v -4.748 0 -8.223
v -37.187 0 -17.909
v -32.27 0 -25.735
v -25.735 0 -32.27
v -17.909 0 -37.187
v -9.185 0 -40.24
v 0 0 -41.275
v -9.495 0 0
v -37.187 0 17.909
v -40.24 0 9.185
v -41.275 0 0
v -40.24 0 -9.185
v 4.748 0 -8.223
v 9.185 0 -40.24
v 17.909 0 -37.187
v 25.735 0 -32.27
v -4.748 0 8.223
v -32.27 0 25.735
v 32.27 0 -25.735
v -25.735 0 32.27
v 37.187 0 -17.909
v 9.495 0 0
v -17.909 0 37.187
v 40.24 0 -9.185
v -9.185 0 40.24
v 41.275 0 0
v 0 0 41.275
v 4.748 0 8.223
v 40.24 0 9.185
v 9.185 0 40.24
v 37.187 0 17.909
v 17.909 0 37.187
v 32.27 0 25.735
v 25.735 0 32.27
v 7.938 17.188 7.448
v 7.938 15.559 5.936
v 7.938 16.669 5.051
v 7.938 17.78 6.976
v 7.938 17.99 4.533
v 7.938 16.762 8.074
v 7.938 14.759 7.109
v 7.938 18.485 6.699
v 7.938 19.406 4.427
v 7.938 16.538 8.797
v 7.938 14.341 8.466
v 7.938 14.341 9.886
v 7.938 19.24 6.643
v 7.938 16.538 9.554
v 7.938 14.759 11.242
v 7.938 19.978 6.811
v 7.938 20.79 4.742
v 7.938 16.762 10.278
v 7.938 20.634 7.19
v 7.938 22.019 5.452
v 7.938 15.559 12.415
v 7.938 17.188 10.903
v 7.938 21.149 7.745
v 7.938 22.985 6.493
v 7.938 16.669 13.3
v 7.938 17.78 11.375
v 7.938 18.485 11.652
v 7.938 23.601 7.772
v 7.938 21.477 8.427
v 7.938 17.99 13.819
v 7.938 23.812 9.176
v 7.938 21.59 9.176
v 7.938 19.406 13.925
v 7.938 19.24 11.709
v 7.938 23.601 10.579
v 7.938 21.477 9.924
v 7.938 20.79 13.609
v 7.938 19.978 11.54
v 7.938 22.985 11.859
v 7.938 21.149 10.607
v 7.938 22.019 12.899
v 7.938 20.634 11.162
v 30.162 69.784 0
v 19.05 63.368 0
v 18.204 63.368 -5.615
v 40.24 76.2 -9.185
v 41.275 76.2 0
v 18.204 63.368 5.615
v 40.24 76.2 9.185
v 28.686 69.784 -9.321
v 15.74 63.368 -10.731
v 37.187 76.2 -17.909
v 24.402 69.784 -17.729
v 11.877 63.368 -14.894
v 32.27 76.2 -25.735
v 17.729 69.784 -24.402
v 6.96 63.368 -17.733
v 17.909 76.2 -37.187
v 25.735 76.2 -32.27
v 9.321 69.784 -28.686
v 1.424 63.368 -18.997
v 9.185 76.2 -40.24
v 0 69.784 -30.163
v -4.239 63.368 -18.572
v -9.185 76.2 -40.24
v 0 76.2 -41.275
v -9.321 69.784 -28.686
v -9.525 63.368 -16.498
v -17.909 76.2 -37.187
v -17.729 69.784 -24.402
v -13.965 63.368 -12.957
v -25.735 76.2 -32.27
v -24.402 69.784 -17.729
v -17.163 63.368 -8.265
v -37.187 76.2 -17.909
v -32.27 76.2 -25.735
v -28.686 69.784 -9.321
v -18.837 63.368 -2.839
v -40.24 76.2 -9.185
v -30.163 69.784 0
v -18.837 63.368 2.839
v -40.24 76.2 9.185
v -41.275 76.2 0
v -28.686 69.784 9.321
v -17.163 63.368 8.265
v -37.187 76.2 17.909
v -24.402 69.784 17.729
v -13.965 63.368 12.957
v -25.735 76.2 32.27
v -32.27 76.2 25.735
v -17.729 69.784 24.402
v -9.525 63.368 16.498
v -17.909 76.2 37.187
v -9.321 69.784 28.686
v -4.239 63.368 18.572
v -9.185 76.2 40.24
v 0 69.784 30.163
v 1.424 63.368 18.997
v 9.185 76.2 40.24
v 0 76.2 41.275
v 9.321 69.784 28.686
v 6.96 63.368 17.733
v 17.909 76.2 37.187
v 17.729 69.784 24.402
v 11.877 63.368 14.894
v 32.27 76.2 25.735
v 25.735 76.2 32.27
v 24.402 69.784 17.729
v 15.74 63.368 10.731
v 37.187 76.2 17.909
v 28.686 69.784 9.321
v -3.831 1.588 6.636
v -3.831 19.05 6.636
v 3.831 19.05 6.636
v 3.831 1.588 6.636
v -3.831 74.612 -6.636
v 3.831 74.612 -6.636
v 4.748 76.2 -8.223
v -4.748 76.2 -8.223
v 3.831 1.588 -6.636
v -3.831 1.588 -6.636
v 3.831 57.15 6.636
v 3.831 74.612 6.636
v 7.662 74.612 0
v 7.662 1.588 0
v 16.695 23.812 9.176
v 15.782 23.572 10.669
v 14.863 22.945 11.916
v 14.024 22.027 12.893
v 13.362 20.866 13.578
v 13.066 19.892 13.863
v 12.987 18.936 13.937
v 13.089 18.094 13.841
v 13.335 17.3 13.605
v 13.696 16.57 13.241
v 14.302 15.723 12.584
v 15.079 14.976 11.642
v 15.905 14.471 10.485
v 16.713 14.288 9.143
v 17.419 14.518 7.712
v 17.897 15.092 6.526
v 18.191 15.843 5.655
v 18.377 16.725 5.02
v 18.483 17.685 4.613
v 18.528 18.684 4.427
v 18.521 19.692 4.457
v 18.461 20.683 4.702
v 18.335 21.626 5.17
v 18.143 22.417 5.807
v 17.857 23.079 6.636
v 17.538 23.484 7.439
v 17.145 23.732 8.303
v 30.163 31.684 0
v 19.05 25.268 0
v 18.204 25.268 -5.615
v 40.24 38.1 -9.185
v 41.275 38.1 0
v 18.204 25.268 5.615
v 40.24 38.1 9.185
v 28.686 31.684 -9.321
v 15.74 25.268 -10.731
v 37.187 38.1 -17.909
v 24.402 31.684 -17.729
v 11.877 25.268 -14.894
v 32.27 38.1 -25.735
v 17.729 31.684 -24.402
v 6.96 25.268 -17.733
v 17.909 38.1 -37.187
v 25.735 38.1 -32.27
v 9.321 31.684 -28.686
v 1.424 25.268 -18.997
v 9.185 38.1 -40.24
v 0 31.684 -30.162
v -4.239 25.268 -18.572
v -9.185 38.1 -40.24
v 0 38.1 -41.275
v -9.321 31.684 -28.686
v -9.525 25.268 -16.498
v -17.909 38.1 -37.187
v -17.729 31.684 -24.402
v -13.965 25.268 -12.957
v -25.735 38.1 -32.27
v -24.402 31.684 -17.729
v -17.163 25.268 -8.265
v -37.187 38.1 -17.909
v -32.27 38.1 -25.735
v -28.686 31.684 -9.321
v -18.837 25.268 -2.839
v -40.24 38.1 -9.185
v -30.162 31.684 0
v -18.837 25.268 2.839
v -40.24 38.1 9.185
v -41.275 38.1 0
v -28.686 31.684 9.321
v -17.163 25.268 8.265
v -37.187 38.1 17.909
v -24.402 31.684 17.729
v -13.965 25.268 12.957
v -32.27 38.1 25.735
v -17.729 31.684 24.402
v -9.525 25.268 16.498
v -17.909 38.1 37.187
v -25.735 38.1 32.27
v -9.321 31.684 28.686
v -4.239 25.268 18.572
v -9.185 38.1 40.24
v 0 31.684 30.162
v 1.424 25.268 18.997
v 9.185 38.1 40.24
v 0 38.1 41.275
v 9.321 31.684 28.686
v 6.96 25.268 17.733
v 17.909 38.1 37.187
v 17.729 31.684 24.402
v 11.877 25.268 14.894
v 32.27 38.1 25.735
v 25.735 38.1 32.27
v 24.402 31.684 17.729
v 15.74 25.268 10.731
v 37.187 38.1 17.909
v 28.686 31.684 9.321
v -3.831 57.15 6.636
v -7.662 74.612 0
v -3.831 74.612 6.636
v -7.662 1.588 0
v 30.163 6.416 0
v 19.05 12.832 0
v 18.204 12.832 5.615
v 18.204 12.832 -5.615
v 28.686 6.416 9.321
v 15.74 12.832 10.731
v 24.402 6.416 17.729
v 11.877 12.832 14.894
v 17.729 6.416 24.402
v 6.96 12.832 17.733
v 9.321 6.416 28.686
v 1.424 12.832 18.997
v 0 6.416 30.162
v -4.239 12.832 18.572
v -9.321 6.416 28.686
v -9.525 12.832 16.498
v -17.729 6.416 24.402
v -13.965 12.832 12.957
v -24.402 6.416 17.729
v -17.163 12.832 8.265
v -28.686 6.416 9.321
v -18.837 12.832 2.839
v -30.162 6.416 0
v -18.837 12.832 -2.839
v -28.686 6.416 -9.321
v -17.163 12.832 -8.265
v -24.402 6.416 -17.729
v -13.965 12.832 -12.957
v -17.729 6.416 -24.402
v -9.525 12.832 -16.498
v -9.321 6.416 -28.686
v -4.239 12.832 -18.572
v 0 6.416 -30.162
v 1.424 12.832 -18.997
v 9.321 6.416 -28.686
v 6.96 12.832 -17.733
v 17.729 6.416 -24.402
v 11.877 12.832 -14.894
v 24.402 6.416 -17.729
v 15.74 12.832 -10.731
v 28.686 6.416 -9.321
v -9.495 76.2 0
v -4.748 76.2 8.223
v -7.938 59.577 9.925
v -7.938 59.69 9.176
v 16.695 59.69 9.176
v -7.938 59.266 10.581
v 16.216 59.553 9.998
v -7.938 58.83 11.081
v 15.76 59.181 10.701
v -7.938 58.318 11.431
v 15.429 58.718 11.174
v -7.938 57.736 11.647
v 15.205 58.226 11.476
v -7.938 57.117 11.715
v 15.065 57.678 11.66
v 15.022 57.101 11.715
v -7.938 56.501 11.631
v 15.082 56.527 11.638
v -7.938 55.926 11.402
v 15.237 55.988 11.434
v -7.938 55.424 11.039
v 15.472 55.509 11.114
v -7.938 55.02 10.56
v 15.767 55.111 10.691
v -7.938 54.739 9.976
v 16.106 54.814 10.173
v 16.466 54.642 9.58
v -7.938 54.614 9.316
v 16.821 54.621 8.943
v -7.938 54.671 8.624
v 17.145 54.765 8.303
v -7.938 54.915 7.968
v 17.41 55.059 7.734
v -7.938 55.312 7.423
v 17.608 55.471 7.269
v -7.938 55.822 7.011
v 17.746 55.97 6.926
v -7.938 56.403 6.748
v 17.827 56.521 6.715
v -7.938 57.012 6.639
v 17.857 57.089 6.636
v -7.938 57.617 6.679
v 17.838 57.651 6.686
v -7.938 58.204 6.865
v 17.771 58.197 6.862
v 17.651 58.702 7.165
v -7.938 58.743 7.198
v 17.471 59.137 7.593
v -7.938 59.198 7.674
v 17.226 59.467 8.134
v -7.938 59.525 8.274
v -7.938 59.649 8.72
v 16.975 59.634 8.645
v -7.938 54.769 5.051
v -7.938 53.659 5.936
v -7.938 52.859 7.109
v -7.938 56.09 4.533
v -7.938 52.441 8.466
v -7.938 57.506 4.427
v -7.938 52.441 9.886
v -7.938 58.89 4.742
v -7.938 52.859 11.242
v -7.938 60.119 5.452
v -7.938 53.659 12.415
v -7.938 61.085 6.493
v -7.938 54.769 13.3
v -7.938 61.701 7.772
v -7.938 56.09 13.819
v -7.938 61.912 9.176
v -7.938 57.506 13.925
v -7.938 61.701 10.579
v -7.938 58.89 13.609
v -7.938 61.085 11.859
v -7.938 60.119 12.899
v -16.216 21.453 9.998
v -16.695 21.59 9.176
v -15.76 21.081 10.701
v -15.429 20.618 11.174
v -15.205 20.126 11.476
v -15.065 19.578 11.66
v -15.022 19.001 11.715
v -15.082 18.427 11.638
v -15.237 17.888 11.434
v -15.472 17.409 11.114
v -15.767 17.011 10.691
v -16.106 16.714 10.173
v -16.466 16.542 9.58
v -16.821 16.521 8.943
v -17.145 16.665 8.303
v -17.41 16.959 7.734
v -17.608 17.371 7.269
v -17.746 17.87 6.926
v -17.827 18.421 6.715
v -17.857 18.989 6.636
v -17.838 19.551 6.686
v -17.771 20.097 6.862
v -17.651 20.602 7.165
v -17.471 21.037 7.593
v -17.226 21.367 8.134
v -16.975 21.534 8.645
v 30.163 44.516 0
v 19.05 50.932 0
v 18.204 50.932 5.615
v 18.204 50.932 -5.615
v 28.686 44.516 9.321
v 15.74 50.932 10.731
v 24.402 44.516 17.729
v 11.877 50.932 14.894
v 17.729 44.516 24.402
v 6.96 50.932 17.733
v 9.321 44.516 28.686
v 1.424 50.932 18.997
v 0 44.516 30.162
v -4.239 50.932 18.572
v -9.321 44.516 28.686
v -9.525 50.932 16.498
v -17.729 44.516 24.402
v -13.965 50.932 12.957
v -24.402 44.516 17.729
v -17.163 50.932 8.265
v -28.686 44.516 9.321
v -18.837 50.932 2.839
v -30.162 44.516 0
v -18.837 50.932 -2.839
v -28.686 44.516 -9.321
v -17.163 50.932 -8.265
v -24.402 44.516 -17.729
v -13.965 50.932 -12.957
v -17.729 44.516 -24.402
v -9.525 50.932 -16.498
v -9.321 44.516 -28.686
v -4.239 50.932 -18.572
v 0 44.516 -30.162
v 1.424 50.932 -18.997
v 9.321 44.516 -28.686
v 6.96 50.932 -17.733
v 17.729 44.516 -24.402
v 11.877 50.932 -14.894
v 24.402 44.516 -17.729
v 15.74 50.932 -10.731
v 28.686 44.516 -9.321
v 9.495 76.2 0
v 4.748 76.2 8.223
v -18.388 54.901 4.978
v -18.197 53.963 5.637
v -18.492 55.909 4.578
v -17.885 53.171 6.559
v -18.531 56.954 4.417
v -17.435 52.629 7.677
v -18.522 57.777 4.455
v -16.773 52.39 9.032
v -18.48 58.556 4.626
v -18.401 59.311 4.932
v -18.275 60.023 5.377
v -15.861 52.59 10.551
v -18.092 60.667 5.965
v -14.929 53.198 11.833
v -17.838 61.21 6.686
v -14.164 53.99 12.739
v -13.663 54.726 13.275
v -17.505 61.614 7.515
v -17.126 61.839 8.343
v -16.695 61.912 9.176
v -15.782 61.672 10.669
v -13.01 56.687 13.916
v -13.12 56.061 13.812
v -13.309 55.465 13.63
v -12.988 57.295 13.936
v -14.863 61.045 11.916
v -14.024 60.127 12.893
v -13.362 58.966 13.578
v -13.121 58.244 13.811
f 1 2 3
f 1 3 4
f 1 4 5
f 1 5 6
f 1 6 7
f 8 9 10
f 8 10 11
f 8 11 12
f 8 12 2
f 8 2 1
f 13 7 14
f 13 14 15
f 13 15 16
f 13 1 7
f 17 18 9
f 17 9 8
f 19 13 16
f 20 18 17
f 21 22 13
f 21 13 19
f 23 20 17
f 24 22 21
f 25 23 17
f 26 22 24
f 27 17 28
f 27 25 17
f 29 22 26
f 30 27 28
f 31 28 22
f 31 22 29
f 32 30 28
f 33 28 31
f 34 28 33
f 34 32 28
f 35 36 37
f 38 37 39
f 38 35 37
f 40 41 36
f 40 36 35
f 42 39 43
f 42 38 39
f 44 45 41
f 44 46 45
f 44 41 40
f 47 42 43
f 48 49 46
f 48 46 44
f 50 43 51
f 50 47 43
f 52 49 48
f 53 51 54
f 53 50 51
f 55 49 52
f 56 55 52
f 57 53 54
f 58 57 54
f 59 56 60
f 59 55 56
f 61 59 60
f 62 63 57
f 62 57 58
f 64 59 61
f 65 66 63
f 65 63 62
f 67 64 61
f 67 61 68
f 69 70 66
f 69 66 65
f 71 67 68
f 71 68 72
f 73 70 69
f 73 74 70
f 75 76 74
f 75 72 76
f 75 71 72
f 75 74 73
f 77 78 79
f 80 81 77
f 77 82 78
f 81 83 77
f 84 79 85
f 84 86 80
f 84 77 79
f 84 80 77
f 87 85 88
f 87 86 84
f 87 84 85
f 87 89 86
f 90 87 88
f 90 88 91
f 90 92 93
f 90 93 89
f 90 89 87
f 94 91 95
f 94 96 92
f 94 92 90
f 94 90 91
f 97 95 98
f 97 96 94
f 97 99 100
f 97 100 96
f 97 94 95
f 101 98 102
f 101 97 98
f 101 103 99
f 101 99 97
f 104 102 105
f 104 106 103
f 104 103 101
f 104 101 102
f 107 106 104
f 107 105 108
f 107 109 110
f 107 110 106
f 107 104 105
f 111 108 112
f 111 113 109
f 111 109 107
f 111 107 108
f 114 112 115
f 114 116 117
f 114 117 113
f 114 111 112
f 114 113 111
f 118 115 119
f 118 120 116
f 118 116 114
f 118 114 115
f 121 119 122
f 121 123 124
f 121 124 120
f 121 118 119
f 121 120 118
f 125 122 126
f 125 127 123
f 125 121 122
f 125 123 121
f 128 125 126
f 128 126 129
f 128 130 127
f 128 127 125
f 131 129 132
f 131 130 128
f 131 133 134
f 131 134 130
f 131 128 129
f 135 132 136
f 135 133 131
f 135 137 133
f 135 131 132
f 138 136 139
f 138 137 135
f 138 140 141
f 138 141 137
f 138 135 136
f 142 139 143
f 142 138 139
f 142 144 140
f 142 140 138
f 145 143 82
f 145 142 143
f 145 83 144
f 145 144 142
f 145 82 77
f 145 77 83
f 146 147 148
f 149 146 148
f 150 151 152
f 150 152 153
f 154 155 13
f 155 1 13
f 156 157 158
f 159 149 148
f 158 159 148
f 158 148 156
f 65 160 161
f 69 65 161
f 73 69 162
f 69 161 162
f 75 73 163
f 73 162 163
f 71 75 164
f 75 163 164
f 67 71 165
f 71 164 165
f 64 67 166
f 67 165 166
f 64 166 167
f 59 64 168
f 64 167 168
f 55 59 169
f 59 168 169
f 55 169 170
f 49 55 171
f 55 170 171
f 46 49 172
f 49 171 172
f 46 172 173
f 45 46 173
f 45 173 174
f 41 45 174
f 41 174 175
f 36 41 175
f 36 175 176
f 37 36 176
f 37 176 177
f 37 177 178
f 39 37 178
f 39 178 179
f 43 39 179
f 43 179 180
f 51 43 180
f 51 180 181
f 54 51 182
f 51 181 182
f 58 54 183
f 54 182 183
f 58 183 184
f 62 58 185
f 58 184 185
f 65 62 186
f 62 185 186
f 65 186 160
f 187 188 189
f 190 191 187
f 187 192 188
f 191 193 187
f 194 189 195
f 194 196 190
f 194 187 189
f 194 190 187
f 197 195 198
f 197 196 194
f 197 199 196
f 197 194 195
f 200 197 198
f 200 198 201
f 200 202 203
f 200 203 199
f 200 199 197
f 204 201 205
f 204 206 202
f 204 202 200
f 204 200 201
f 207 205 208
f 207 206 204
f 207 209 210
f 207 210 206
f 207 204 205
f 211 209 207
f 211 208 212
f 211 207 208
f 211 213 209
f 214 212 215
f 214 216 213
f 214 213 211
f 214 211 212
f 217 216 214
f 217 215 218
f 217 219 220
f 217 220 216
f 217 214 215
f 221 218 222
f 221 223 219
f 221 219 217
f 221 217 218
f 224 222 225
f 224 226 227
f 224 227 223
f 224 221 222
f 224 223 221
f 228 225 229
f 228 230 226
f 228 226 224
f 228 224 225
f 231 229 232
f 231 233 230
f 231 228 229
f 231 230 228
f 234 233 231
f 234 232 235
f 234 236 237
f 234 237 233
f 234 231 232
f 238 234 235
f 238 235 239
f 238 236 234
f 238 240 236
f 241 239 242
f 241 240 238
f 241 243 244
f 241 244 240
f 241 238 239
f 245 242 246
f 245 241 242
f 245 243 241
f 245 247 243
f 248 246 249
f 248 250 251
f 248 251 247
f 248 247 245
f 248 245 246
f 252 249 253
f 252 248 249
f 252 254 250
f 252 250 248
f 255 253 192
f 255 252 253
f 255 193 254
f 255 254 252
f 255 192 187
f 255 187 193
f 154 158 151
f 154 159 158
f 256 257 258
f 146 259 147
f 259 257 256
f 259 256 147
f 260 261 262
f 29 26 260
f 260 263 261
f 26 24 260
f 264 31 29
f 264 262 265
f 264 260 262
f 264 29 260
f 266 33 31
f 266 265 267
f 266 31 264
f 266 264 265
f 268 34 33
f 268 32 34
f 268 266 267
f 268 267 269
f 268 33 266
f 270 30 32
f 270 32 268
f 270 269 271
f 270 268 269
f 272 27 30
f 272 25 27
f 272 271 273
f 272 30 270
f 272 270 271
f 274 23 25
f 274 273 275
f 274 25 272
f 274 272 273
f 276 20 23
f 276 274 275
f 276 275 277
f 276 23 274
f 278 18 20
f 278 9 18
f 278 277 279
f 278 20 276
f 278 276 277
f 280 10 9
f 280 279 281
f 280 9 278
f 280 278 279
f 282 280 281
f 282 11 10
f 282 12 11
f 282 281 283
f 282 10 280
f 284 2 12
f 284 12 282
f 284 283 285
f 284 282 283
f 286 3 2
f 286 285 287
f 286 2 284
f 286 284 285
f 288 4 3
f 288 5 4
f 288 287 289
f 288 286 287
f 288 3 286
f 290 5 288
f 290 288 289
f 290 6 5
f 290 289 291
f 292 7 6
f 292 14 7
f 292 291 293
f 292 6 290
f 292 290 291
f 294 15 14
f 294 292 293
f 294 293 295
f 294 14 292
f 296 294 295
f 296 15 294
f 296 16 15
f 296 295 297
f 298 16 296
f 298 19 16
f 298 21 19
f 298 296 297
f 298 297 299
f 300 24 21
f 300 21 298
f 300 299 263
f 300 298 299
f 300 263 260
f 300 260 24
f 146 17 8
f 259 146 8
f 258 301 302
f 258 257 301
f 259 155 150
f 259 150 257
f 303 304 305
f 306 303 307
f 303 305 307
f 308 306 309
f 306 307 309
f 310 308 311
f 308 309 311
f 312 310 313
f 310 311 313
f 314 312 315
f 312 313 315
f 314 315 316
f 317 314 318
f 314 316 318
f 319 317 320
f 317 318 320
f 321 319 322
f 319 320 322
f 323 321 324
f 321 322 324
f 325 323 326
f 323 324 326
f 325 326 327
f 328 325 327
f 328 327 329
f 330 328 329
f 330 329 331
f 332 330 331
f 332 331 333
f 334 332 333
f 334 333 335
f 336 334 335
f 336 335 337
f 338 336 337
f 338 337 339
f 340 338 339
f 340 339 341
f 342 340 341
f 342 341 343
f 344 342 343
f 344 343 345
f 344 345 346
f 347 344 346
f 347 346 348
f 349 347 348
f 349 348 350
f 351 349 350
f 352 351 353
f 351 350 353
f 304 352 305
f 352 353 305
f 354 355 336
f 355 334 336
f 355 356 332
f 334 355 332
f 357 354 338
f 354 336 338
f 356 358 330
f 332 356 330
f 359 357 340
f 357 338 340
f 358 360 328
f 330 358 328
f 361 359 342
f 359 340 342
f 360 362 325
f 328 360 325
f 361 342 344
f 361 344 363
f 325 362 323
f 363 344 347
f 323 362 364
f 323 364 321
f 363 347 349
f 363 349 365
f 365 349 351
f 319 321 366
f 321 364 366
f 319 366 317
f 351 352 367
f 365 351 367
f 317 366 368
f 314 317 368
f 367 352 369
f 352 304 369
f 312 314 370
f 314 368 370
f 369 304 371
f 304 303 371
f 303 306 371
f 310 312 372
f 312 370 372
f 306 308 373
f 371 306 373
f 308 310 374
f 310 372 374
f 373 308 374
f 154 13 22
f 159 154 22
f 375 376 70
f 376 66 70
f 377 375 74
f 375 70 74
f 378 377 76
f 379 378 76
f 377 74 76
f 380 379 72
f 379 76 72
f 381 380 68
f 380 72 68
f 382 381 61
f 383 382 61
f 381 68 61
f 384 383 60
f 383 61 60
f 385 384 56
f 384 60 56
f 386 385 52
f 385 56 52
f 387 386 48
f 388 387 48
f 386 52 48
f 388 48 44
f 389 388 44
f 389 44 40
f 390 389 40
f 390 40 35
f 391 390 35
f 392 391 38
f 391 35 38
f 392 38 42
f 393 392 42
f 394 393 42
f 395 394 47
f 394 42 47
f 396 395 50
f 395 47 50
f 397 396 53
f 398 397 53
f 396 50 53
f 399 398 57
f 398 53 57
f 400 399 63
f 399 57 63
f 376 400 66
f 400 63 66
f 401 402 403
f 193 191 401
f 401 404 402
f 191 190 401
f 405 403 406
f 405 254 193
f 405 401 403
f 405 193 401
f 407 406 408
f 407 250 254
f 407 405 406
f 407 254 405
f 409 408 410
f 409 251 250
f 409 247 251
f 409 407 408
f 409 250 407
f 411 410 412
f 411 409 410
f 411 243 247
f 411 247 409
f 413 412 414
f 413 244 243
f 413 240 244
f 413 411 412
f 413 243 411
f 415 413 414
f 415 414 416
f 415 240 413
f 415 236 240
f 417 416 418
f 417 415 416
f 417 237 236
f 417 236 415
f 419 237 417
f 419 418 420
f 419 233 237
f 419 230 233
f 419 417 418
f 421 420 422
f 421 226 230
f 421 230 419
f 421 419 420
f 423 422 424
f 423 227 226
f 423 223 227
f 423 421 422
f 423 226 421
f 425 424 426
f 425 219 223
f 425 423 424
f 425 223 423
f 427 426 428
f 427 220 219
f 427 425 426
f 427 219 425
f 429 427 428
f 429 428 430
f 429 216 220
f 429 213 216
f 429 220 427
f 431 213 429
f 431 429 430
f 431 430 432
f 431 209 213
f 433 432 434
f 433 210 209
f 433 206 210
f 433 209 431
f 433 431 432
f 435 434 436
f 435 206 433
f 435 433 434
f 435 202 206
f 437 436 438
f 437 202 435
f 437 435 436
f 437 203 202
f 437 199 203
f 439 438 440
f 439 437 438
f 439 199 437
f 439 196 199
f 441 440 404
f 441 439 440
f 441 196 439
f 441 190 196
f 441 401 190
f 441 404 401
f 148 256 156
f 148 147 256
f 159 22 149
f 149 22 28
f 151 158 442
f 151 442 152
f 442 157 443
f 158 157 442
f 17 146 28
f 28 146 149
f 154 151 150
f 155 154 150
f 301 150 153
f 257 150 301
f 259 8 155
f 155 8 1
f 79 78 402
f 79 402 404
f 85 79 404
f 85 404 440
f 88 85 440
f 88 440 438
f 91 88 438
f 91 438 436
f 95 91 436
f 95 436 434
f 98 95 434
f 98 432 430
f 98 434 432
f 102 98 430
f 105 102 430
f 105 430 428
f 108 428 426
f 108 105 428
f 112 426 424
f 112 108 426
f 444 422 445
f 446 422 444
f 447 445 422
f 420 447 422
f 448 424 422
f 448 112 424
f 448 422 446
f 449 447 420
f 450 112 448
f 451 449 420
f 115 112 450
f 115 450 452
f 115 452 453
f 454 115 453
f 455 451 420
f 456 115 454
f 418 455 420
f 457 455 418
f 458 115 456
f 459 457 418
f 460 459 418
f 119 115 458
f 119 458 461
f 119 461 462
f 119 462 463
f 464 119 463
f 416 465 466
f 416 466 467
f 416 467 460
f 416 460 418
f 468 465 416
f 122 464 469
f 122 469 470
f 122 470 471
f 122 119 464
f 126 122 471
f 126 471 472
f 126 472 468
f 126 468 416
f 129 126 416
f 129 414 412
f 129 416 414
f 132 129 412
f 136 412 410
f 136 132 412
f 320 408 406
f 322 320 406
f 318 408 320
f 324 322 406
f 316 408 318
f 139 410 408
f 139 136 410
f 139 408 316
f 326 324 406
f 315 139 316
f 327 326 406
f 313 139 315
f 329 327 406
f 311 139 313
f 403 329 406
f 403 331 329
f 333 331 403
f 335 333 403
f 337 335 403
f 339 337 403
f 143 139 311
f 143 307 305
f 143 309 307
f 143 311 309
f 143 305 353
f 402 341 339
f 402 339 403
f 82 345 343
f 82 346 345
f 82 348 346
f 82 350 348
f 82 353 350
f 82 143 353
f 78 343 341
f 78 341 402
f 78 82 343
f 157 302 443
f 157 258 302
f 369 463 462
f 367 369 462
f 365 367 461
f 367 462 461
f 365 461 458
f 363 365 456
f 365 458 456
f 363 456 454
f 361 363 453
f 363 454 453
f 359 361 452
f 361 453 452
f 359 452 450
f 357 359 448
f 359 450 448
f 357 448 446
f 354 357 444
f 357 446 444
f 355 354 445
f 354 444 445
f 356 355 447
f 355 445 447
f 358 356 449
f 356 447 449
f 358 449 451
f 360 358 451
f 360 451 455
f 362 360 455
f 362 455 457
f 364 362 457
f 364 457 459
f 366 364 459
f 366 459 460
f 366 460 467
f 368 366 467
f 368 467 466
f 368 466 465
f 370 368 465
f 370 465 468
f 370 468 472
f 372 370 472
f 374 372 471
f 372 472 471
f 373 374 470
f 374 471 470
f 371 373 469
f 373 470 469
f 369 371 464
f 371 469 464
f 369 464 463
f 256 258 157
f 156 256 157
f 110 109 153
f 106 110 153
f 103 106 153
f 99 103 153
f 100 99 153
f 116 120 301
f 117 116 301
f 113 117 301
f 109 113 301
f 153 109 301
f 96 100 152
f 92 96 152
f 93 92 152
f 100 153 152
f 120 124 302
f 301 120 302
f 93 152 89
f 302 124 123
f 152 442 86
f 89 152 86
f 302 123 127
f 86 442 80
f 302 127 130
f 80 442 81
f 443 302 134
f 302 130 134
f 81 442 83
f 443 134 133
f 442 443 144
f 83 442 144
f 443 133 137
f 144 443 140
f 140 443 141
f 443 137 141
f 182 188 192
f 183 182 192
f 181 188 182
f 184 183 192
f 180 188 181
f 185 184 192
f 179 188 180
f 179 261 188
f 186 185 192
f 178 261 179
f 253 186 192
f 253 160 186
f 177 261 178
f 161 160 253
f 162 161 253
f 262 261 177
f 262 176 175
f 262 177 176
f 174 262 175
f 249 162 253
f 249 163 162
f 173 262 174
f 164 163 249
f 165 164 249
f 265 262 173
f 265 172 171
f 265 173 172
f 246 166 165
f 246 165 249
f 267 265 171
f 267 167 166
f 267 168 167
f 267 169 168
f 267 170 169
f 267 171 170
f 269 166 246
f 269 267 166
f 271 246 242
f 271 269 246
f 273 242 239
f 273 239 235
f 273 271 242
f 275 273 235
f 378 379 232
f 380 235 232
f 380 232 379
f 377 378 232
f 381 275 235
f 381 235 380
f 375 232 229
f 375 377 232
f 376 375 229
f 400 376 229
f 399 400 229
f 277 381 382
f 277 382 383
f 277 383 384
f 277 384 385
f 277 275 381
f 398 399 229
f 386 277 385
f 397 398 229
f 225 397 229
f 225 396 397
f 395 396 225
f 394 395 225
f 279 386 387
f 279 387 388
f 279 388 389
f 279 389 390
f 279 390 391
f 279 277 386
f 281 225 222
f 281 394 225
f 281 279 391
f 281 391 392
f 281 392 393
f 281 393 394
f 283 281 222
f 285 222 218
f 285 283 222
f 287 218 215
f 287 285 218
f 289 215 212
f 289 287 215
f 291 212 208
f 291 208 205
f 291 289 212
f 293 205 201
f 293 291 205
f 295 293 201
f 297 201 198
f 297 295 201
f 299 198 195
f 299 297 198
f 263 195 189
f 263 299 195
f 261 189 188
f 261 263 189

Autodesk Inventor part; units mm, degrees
ref_plane "XZ Plane" through (0, 0, 0) normal (0, 1, 0) x (-1, 0, 0)
sketch "Sketch15" plane through (0, 0, 0) normal (0, 0, 1) x (1, 0, 0)
  line L0 (41.275, 0) -> (41.275, 76.2) construction
  line L1 (0, 0) -> (41.275, 0)
  line L2 (0, 76.2) -> (41.275, 76.2)
  line L3 (19.05, 0) -> (19.05, 76.2) construction
  line L4 (0, 76.2) -> (0, 0)
  line L5 (19.05, 19.05) -> (41.275, 19.05) construction
  line L6 (41.275, 0) -> (19.05, 12.8316)
  line L7 (41.275, 38.1) -> (19.05, 25.2684)
  line L8 (19.05, 25.2684) -> (41.275, 25.2684) construction
  line L9 (19.05, 25.2684) -> (19.05, 12.8316)
  line L10 (41.275, 38.1) -> (19.05, 50.9316)
  line L11 (19.05, 50.9316) -> (19.05, 63.3684)
  line L12 (19.05, 63.3684) -> (41.275, 76.2)
  line L13 (41.275, 38.1) -> (19.05, 38.1) construction
  line L14 (19.05, 63.3684) -> (41.275, 63.3684) construction
  dimension "d85" = 41.275
  dimension "d86" = 76.2
  dimension "d87" = 19.05
  dimension "d88" = 41.275
  dimension "d89" = 38.1
  dimension "centerLineForSpool" = 19.05
  dimension "d93" = 30
  dimension "d94" = 30
  dimension "d95" = 30
  dimension "d96" = 30
revolve "Revolution2" add sketch "Sketch15" angle 360 about axis through (0, 76.2, 0) along (0, -1, 0)
sketch "Sketch16" plane through (0, 0, 0) normal (0, -1, 0) x (1, 0, 0)
  line L0 (-7.6623, 0) -> (-3.8312, 6.6357)
  line L1 (-3.8312, 6.6357) -> (3.8312, 6.6357)
  line L2 (3.8312, 6.6357) -> (7.6623, 0)
  line L3 (7.6623, 0) -> (3.8312, -6.6358)
  line L4 (3.8312, -6.6358) -> (-3.8312, -6.6358)
  line L5 (-3.8312, -6.6358) -> (-7.6623, 0)
  point P0 (0, 0)
  point P1 (0, 0)
  dimension "d103" = 13.2715
extrude "Extrusion11" cut sketch "Sketch16" against normal through all
sketch "Sketch17" plane through (0, 0, 0) normal (1, 0, 0) x (0, 1, 0)
  circle A0 centre (57.15, 9.1757) radius 2.54
  circle A1 centre (19.05, 9.1757) radius 2.54
  line L0 (0, 41.275) -> (0, -41.275) projected
  line L1 (76.2, 41.275) -> (76.2, -41.275) projected
  line L2 (0, 6.6357) -> (76.2, 6.6357) projected
  point P0 (0, 0)
  dimension "d110" = 19.05
  dimension "d111" = 19.05
  dimension "d112" = 5.08
extrude "Extrusion13" cut sketch "Sketch17" along normal through all both and the other way through all
ref_plane "Work Plane4" through (-19.05, 0, 0) normal (1, 0, 0) x (0, 1, 0)
sketch "Sketch22" plane through (-19.05, 0, 0) normal (1, 0, 0) x (0, 1, 0)
  spline S0 degree 8 poles (59.69, 9.1757) (59.69, 9.4517) (59.6557, 9.7212) (59.59, 9.9804) (59.4956, 10.2261) (59.3755, 10.4557) (59.2323, 10.6669) (59.0691, 10.858) (58.7144, 11.191) (58.5225, 11.336) (58.3154, 11.4599) (58.0958, 11.5609) (57.8667, 11.6378) (57.6308, 11.6896) (57.3909, 11.7157) (56.8686, 11.7157) (56.5893, 11.6801) (56.3163, 11.6098) (56.0539, 11.5059) (55.8062, 11.37) (55.5775, 11.2041) (55.3719, 11.0111) (55.0147, 10.5794) (54.8595, 10.3366) (54.7333, 10.0693) (54.6415, 9.7817) (54.5882, 9.479) (54.5771, 9.1672) (54.6105, 8.8531) (54.8032, 8.1024) (55.0034, 7.6991) (55.2751, 7.3483) (55.6037, 7.0608) (55.9729, 6.8444) (56.3656, 6.703) (56.7635, 6.6357) (57.4276, 6.6357) (57.7065, 6.6704) (57.9827, 6.7403) (58.2517, 6.8459) (58.509, 6.9871) (58.7494, 7.1637) (58.9676, 7.3748) (59.2832, 7.7816) (59.3962, 7.9584) (59.4932, 8.1474) (59.5721, 8.3459) (59.6315, 8.5511) (59.6708, 8.76) (59.69, 8.9692) (59.69, 9.1757) knots 0 0 0 0 0 0 0 0 0 0.129052 0.129052 0.129052 0.129052 0.129052 0.129052 0.129052 0.253777 0.253777 0.253777 0.253777 0.253777 0.253777 0.253777 0.399469 0.399469 0.399469 0.399469 0.399469 0.399469 0.399469 0.544533 0.544533 0.544533 0.544533 0.544533 0.544533 0.544533 0.751894 0.751894 0.751894 0.751894 0.751894 0.751894 0.751894 0.900801 0.900801 0.900801 0.900801 0.900801 0.900801 0.900801 1 1 1 1 1 1 1 1 1 projected
  circle A0 centre (57.15, 9.1757) radius 4.7625
  circle A1 centre (57.15, 9.1757) radius 2.54 construction
  line L0 (57.15, 6.6357) -> (76.2, 6.6357) construction
  line L1 (76.2, 41.275) -> (76.2, -41.275) construction
  point P0 (0, 0)
  dimension "d121" = 19.05
  dimension "d122" = 5.08
  dimension "d125" = 9.525
extrude "Extrusion16" cut sketch "Sketch22" along normal blind 11.1125
ref_plane "Work Plane5" through (19.05, 0, 0) normal (1, 0, 0) x (0, 1, 0)
sketch "Sketch23" plane through (19.05, 0, 0) normal (1, 0, 0) x (0, 1, 0)
  line L0 (19.05, 6.6357) -> (57.15, 6.6357) projected
  circle A0 centre (19.05, 9.1757) radius 2.54 construction
  line L1 (0, 41.275) -> (0, -41.275) projected
  circle A1 centre (19.05, 9.1757) radius 4.7625
  point P0 (0, 0)
  dimension "d127" = 5.08
  dimension "d128" = 19.05
  dimension "d129" = 9.525
extrude "Extrusion17" cut sketch "Sketch23" against normal blind 11.1125
chamfer "Chamfer10" distance 1.5875 angle 45 12 edges at (0, 76.2, -6.6358) (5.7467, 76.2, -3.3179) (5.7467, 76.2, 3.3179) (0, 76.2, 6.6357) (-5.7467, 76.2, 3.3179) (-5.7467, 76.2, -3.3179) (-5.7467, 0, -3.3179) (-5.7467, 0, 3.3179) (0, 0, 6.6357) (5.7467, 0, 3.3179) (5.7467, 0, -3.3179) (0, 0, -6.6358)
equation "\"d85\" = spoolExteriorRadius"
equation "\"d86\" = spoolOverallHeight"
equation "\"d88\" = d85"
equation "\"d89\" = 0.5 * spoolOverallHeight"
equation "\"centerLineForSpool\" = 0.25 * spoolOverallHeight"
equation "\"d103\" = hexDiameter"
equation "\"d110\" = centerLineForSpool"
equation "\"d111\" = centerLineForSpool"
equation "\"d112\" = holeForString"
equation "\"d121\" = centerLineForSpool"
equation "\"d122\" = holeForString"
equation "\"d125\" = knotHoleDiameter"
equation "\"d127\" = holeForString"
equation "\"d128\" = centerLineForSpool"
equation "\"d129\" = knotHoleDiameter"
equation "\"d130\" = knotHoleDepth"
equation "\"d132\" = hexHoleChamfer"
equation "\"holeForString\" = stringDiameter + clearanceForString"
equation "\"stringDiameter\" = 3.048"
equation "\"clearanceForString\" = 2.032"
equation "\"spoolHeightWithoutSpacer\" = 69.85"
equation "\"hexShaftDiameter\" = 12.7"
equation "\"clearanceForHexShaft\" = 0.5715"
equation "\"hexDiameter\" = hexShaftDiameter + clearanceForHexShaft"
equation "\"supportChannels\" = 3.81"
equation "\"spoolInteriorDiameter\" = 38.1"
equation "\"spoolInteriroRadius\" = 0.5 * spoolInteriorDiameter"
equation "\"spoolExteriorDiameter\" = 82.55"
equation "\"spoolExteriorRadius\" = 0.5 * spoolExteriorDiameter"
equation "\"spoolFiletRadius\" = 0.5 * supportChannels"
equation "\"holeCenter\" = 0.25 * spoolHeightWithoutSpacer - 0.75 * supportChannels"
equation "\"hexHoleChamfer\" = 1.5875"
equation "\"stringHoleCenterFromHexShaft\" = 0.5 * hexDiameter + 0.5 * holeForString"
equation "\"textCircleDiameter\" = 0.75 * spoolExteriorDiameter"
equation "\"textHeight\" = 6.096"
equation "\"textDepth\" = 1.27"
equation "\"stringHoleChamfer\" = 4.7625"
equation "\"spoolTotalHeight\" = 76.2"
equation "\"spaceHeight\" = spoolTotalHeight - spoolHeightWithoutSpacer"
equation "\"spacerDiameter\" = 24.13"
equation "\"spoolOverallHeight\" = 76.2"
equation "\"d114\" = -spoolInteriroRadius"
equation "\"knotHoleDiameter\" = 9.525"
equation "\"d126\" = spoolInteriroRadius"
equation "\"knotHoleDepth\" = 11.1125"
properties part number "spoolV06" material "PC/ABS Plastic"
